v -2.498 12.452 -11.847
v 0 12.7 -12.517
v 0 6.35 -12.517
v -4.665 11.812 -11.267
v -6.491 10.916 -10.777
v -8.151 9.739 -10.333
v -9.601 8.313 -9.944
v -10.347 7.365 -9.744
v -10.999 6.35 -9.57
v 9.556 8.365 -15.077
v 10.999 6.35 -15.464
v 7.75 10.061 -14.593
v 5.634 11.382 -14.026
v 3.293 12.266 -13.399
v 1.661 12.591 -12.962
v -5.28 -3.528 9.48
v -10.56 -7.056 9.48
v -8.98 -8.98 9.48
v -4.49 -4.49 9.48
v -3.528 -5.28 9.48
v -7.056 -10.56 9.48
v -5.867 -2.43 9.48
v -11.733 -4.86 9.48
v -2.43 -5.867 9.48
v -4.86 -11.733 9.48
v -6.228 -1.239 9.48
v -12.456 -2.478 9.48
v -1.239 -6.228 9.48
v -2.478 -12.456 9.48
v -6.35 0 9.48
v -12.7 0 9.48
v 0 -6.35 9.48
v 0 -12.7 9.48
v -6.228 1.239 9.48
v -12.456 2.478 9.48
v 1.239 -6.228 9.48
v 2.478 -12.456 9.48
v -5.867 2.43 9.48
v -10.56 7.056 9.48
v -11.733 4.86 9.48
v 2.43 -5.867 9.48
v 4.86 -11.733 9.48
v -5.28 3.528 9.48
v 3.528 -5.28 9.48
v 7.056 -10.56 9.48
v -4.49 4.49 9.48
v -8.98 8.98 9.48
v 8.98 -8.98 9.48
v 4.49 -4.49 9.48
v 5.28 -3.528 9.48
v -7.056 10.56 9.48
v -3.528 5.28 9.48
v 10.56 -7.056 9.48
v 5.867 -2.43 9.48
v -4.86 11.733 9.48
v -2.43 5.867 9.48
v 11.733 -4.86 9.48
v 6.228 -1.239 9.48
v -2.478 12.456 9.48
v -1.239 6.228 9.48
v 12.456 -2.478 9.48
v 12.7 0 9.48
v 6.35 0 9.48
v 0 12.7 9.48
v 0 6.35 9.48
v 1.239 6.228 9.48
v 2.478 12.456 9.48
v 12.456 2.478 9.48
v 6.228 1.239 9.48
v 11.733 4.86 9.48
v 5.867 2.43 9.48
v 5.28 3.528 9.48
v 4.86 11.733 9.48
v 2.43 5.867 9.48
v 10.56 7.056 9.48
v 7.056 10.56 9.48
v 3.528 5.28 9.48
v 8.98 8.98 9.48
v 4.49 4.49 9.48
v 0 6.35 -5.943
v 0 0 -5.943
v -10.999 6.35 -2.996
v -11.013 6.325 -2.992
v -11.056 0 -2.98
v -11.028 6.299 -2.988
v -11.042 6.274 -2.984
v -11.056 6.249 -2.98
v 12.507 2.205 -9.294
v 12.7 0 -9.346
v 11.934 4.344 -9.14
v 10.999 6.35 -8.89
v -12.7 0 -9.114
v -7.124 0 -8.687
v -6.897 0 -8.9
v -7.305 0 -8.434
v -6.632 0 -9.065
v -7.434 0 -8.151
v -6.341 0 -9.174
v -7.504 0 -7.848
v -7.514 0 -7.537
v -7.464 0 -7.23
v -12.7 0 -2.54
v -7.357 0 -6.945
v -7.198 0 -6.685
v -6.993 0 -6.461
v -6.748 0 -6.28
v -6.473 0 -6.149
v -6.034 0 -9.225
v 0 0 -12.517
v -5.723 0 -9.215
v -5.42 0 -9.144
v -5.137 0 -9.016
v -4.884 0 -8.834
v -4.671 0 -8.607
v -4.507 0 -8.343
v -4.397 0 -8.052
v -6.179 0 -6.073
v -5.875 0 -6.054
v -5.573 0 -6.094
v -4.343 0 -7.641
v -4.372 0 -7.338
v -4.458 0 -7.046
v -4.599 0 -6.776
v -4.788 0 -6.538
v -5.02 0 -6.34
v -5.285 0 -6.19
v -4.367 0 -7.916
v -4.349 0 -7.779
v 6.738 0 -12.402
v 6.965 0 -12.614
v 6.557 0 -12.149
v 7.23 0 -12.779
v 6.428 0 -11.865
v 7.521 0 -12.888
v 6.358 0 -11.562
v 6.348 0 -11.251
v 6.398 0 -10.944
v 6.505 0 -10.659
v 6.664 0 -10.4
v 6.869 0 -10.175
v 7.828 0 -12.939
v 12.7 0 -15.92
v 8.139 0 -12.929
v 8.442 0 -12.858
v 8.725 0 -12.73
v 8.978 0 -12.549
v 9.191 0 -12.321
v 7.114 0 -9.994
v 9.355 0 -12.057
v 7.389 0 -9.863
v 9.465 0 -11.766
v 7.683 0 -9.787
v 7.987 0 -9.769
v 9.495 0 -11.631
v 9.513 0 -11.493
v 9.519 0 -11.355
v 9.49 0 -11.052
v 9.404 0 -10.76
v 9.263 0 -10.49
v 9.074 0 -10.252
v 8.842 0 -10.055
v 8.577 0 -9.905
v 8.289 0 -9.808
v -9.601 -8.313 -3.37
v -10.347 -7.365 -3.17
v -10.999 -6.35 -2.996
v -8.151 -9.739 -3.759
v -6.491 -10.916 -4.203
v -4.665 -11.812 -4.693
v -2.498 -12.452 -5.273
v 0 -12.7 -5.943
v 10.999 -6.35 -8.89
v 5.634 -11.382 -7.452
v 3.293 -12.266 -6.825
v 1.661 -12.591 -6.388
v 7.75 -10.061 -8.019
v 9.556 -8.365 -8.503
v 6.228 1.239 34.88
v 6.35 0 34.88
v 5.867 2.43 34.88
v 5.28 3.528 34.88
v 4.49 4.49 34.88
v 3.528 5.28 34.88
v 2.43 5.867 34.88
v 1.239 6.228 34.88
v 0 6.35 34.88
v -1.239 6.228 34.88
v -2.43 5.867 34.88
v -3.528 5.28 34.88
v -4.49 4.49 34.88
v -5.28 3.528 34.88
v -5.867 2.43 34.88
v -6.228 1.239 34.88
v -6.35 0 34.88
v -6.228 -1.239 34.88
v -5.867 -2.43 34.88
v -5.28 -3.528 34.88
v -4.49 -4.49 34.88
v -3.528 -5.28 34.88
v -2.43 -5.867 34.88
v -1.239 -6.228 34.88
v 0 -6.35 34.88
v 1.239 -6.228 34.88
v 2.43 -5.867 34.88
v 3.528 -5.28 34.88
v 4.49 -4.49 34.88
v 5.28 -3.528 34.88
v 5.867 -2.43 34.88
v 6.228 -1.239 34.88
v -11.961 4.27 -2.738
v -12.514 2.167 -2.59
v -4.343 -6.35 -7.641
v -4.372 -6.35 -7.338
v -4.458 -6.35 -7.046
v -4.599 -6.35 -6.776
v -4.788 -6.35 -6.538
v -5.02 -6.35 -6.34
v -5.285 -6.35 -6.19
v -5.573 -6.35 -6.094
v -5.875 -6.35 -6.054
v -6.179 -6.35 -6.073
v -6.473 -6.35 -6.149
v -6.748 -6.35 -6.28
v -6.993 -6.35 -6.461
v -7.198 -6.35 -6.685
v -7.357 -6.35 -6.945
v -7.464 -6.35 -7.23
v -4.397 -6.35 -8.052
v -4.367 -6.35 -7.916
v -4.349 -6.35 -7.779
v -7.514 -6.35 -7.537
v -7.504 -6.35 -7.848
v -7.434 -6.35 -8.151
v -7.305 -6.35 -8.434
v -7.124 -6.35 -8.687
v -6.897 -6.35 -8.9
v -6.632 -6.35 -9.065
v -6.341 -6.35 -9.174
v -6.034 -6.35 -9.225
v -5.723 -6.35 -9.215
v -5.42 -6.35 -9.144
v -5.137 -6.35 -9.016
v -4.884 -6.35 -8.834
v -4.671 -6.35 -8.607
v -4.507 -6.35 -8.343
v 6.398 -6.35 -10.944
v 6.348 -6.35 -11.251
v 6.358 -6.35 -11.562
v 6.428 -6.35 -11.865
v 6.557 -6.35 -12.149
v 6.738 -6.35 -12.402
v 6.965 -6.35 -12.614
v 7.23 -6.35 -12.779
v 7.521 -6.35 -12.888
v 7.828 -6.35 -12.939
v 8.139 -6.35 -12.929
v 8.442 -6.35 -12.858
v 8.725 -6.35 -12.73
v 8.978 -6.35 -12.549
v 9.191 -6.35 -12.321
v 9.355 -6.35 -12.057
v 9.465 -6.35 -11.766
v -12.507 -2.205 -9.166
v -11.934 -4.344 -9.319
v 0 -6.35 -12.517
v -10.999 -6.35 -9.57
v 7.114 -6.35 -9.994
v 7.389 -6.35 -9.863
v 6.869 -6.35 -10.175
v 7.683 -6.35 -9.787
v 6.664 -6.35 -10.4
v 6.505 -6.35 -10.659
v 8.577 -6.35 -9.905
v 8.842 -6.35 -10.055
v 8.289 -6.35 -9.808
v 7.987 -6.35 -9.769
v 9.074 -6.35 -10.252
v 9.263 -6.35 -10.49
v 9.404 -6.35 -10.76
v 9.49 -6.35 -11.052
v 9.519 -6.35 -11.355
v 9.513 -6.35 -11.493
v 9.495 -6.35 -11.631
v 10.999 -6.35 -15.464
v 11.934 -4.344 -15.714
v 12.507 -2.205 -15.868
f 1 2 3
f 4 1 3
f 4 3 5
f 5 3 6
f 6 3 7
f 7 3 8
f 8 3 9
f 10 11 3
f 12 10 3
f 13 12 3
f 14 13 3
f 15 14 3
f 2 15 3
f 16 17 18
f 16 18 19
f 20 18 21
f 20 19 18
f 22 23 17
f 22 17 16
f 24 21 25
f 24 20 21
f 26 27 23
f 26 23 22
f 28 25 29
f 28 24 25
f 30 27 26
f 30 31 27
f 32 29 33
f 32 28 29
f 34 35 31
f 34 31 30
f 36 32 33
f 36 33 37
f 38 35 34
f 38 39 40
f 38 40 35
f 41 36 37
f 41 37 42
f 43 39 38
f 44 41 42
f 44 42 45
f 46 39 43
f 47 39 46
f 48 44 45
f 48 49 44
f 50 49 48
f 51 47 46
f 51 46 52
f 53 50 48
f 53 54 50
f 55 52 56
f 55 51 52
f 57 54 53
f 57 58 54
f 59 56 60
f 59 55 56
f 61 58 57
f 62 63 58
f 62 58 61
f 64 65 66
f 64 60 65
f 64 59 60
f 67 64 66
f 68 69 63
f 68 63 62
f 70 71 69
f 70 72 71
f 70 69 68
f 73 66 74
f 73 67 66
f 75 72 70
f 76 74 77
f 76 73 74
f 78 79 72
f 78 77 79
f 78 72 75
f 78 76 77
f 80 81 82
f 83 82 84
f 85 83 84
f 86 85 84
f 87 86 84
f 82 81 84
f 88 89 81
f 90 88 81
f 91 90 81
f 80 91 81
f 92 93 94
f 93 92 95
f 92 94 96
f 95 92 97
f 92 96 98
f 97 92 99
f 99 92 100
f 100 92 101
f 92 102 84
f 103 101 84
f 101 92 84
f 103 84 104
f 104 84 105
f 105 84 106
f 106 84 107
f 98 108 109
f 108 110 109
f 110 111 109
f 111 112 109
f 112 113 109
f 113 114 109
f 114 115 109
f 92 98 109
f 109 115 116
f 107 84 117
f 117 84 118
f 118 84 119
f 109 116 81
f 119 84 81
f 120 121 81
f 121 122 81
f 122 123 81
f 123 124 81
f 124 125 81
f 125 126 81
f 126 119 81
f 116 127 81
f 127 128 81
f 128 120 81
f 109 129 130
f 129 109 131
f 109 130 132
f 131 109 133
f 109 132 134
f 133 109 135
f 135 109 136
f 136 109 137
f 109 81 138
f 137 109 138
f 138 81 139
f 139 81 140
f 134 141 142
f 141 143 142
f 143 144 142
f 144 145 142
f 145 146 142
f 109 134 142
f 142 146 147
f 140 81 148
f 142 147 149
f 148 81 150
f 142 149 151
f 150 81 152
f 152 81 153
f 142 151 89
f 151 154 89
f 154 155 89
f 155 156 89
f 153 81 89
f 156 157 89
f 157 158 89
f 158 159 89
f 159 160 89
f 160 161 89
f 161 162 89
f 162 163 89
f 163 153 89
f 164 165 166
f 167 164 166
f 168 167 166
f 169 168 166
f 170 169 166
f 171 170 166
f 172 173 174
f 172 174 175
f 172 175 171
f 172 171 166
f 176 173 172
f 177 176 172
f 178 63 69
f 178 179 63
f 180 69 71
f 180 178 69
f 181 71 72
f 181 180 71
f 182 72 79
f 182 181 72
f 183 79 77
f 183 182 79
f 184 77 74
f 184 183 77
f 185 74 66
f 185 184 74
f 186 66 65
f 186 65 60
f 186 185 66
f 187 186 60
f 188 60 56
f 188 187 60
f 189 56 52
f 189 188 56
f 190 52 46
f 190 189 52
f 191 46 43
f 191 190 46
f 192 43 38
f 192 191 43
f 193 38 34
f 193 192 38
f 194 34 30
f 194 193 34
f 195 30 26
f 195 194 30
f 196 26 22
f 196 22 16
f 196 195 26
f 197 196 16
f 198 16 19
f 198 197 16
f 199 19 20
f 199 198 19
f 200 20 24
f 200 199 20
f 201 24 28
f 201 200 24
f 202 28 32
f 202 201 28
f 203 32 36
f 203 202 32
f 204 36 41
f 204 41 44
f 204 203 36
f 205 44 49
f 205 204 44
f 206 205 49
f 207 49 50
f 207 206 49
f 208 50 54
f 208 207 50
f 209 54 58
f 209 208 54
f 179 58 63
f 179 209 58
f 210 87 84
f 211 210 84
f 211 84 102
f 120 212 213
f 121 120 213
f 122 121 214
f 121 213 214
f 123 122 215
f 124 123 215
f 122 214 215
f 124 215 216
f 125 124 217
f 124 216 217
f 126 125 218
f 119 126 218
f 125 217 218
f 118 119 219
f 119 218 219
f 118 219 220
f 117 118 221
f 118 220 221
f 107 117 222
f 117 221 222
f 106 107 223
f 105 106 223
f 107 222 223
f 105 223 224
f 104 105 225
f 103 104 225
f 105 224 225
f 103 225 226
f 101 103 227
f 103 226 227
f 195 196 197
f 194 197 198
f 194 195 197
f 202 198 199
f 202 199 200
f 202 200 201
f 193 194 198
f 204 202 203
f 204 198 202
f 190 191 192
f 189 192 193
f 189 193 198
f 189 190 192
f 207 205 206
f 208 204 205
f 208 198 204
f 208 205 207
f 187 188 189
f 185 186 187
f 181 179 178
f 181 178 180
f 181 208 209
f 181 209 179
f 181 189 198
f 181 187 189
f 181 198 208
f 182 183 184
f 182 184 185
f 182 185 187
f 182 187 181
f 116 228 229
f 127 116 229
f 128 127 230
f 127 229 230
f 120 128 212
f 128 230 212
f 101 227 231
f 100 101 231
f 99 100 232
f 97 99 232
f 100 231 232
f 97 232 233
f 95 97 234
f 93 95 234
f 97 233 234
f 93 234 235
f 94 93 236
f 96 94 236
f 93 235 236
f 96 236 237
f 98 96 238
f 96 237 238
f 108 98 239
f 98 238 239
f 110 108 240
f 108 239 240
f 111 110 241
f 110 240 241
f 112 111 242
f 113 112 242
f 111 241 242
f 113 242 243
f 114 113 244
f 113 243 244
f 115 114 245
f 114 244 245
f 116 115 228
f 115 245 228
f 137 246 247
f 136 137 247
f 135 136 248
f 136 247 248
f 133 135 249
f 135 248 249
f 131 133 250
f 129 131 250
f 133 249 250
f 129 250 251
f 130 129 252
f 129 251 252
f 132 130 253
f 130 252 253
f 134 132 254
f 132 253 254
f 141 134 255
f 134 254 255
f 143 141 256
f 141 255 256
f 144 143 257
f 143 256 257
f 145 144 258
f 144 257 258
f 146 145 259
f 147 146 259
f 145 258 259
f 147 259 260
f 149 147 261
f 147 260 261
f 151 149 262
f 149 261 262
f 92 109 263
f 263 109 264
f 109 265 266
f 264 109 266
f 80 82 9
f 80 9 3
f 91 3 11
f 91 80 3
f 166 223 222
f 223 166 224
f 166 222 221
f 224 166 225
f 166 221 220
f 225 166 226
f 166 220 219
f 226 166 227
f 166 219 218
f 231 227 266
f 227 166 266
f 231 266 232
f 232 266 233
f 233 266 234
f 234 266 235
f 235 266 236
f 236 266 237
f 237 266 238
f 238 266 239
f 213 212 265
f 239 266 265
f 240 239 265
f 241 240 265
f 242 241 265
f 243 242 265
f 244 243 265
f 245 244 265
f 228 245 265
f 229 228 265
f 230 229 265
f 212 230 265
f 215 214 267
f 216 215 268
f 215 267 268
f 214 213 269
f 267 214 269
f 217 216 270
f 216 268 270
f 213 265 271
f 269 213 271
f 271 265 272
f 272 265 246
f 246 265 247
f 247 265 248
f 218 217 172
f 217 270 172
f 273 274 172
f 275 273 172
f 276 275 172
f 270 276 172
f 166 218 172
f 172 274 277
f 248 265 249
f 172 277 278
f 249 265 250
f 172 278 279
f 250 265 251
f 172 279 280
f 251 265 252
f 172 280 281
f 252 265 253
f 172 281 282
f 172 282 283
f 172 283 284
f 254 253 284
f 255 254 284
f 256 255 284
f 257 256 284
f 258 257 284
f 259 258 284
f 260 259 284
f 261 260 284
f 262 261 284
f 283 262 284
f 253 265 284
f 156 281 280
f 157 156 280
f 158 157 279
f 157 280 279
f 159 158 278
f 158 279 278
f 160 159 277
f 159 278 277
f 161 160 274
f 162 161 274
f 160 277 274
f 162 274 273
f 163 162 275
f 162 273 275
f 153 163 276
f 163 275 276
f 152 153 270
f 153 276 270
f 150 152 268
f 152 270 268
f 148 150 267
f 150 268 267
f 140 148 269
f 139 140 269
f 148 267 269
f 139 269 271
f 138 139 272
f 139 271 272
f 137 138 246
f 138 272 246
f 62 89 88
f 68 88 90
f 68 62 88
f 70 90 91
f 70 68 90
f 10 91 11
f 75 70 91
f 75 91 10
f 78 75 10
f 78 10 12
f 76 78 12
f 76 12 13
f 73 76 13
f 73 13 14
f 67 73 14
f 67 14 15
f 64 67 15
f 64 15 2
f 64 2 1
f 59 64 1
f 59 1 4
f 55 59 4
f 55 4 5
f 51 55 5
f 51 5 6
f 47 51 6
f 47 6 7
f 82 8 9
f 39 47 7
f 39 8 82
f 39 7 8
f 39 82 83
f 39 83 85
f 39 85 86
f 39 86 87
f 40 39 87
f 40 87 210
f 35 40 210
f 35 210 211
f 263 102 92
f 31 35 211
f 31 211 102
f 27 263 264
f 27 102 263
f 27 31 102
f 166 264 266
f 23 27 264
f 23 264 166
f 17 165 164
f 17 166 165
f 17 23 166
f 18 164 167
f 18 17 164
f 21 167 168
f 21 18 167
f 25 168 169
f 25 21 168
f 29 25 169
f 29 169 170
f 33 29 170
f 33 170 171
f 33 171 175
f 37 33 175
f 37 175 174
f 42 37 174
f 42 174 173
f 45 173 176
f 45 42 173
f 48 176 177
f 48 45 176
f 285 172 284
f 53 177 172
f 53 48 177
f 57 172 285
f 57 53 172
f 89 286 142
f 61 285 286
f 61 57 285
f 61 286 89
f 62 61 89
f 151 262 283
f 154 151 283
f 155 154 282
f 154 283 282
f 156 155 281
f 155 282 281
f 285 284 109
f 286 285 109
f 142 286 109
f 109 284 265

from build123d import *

# Parameters (mm, degrees)
F2_DEPTH = 12.7
F3_DEPTH = 6.35
F4_W     = 1.7614989947
F4_H     = 6.35
F5_DEPTH = 6.35
F7_DEPTH = 6.35


with BuildPart() as f1:
    # F0 (on Front) → F1 (revolve)
    with BuildSketch(Plane.XZ):
        Polygon((12.7, 9.4802887884), (6.35, 9.4802887884), (6.35, 34.8802887884), (0, 34.8802887884), (0, -5.9427527222), (12.7, -9.345707466), align=None)
        Polygon((0, -15.9197112116), (12.7, -15.9197112116), (0, -12.5167564678), align=None)
        Polygon((12.7, -15.9197112116), (12.7, -9.345707466), (0, -5.9427527222), (0, -12.5167564678), align=None)
    revolve(axis=Axis((0, 0, 9.4802887884), (0, 0, 1)))

    # F0 (on Front) → F2 (cut, symmetric)
    with BuildSketch(Plane.XZ):
        Polygon((-12.7, -15.9197112116), (0, -15.9197112116), (0, -12.5167564678), (-12.7, -9.1138017239), align=None)
        Polygon((0, -15.9197112116), (12.7, -15.9197112116), (0, -12.5167564678), align=None)
    extrude(amount=F2_DEPTH, both=True, mode=Mode.SUBTRACT)

    # F0 (on Front) → F3 (cut)
    with BuildSketch(Plane.XZ):
        Polygon((0, -12.5167564678), (0, -5.9427527222), (-11.0564990636, -2.980172727), (-12.7, -9.1138017239), align=None)
        Polygon((12.7, -15.9197112116), (12.7, -9.345707466), (0, -5.9427527222), (0, -12.5167564678), align=None)
        Polygon((-12.7, -9.1138017239), (-11.0564990636, -2.980172727), (-12.7, -2.5397979783), align=None)
    extrude(amount=-F3_DEPTH, mode=Mode.SUBTRACT)

    # F4 (on face) → F5 (cut)
    with BuildSketch(Plane(origin=(-3.1291891169, 0, -11.6782927709), x_dir=(0.9659258263, 0, -0.2588190451), z_dir=(-0.2588190451, 0, -0.9659258263))):
        with BuildLine():
            Line((-8.1469335398, 6.35), (3.5889137071, 6.35))
            Line((3.5889137071, 6.35), (14.6260834533, 6.35))
            add(Edge.make_bspline(
                [(3.2395749568, 12.7), (10.8305806211, 12.7), (14.6260834533, 6.35)],
                knots=[1.5707963268, 1.5707963268, 1.5707963268, 2.6058232788, 2.6058232788, 2.6058232788], degree=2, weights=[1, 0.8070072037, 0.8683475024]))
            add(Edge.make_bspline(
                [(-8.1469335398, 6.35), (-4.3514307076, 12.7), (3.2395749568, 12.7)],
                knots=[0.5357693748, 0.5357693748, 0.5357693748, 1.5707963268, 1.5707963268, 1.5707963268], degree=2, weights=[0.8683475024, 0.8070072037, 1]))
        make_face()
        with BuildLine():
            Line((-8.1469335398, 12.7), (-8.1469335398, 6.35))
            add(Edge.make_bspline(
                [(-8.1469335398, 6.35), (-4.3514307076, 12.7), (3.2395749568, 12.7)],
                knots=[0.5357693748, 0.5357693748, 0.5357693748, 1.5707963268, 1.5707963268, 1.5707963268], degree=2, weights=[0.8683475024, 0.8070072037, 1]))
            Line((3.2395749568, 12.7), (-8.1469335398, 12.7))
        make_face()
        with Locations((-9.0276830371, 9.525)):
            Rectangle(F4_W, F4_H)
    extrude(amount=-F5_DEPTH, mode=Mode.SUBTRACT)

    # F6 (on face) → F7 (cut)
    with BuildSketch(Plane.XZ.offset(6.35)):
        with BuildLine():
            Line((-4.3968861542, -8.0516125007), (-7.4637006527, -7.2298620325))
            ThreePointArc((-7.4637006527, -7.2298620325), (-6.3411686376, -9.1741445159), (-4.3968861542, -8.0516125007))
        make_face()
        with BuildLine():
            ThreePointArc((-4.3427934035, -7.6407372666), (-5.7230830733, -6.0668185492), (-7.4637006527, -7.2298620325))
            Line((-7.4637006527, -7.2298620325), (-4.3968861542, -8.0516125007))
            ThreePointArc((-4.3968861542, -8.0516125007), (-4.356374686, -7.8479475968), (-4.3427934035, -7.6407372666))
        make_face()
        with BuildLine():
            Line((6.3983008804, -10.9441741488), (9.4651153788, -11.765924617))
            ThreePointArc((9.4651153788, -11.765924617), (9.505626847, -11.562259713), (9.5192081296, -11.3550493829))
            ThreePointArc((9.5192081296, -11.3550493829), (8.1389184597, -9.7811306655), (6.3983008804, -10.9441741488))
        make_face()
        with BuildLine():
            ThreePointArc((6.3983008804, -10.9441741488), (7.5208328955, -12.8884566321), (9.4651153788, -11.765924617))
            Line((9.4651153788, -11.765924617), (6.3983008804, -10.9441741488))
        make_face()
    extrude(amount=-F7_DEPTH, mode=Mode.SUBTRACT)


solid = f1.part
